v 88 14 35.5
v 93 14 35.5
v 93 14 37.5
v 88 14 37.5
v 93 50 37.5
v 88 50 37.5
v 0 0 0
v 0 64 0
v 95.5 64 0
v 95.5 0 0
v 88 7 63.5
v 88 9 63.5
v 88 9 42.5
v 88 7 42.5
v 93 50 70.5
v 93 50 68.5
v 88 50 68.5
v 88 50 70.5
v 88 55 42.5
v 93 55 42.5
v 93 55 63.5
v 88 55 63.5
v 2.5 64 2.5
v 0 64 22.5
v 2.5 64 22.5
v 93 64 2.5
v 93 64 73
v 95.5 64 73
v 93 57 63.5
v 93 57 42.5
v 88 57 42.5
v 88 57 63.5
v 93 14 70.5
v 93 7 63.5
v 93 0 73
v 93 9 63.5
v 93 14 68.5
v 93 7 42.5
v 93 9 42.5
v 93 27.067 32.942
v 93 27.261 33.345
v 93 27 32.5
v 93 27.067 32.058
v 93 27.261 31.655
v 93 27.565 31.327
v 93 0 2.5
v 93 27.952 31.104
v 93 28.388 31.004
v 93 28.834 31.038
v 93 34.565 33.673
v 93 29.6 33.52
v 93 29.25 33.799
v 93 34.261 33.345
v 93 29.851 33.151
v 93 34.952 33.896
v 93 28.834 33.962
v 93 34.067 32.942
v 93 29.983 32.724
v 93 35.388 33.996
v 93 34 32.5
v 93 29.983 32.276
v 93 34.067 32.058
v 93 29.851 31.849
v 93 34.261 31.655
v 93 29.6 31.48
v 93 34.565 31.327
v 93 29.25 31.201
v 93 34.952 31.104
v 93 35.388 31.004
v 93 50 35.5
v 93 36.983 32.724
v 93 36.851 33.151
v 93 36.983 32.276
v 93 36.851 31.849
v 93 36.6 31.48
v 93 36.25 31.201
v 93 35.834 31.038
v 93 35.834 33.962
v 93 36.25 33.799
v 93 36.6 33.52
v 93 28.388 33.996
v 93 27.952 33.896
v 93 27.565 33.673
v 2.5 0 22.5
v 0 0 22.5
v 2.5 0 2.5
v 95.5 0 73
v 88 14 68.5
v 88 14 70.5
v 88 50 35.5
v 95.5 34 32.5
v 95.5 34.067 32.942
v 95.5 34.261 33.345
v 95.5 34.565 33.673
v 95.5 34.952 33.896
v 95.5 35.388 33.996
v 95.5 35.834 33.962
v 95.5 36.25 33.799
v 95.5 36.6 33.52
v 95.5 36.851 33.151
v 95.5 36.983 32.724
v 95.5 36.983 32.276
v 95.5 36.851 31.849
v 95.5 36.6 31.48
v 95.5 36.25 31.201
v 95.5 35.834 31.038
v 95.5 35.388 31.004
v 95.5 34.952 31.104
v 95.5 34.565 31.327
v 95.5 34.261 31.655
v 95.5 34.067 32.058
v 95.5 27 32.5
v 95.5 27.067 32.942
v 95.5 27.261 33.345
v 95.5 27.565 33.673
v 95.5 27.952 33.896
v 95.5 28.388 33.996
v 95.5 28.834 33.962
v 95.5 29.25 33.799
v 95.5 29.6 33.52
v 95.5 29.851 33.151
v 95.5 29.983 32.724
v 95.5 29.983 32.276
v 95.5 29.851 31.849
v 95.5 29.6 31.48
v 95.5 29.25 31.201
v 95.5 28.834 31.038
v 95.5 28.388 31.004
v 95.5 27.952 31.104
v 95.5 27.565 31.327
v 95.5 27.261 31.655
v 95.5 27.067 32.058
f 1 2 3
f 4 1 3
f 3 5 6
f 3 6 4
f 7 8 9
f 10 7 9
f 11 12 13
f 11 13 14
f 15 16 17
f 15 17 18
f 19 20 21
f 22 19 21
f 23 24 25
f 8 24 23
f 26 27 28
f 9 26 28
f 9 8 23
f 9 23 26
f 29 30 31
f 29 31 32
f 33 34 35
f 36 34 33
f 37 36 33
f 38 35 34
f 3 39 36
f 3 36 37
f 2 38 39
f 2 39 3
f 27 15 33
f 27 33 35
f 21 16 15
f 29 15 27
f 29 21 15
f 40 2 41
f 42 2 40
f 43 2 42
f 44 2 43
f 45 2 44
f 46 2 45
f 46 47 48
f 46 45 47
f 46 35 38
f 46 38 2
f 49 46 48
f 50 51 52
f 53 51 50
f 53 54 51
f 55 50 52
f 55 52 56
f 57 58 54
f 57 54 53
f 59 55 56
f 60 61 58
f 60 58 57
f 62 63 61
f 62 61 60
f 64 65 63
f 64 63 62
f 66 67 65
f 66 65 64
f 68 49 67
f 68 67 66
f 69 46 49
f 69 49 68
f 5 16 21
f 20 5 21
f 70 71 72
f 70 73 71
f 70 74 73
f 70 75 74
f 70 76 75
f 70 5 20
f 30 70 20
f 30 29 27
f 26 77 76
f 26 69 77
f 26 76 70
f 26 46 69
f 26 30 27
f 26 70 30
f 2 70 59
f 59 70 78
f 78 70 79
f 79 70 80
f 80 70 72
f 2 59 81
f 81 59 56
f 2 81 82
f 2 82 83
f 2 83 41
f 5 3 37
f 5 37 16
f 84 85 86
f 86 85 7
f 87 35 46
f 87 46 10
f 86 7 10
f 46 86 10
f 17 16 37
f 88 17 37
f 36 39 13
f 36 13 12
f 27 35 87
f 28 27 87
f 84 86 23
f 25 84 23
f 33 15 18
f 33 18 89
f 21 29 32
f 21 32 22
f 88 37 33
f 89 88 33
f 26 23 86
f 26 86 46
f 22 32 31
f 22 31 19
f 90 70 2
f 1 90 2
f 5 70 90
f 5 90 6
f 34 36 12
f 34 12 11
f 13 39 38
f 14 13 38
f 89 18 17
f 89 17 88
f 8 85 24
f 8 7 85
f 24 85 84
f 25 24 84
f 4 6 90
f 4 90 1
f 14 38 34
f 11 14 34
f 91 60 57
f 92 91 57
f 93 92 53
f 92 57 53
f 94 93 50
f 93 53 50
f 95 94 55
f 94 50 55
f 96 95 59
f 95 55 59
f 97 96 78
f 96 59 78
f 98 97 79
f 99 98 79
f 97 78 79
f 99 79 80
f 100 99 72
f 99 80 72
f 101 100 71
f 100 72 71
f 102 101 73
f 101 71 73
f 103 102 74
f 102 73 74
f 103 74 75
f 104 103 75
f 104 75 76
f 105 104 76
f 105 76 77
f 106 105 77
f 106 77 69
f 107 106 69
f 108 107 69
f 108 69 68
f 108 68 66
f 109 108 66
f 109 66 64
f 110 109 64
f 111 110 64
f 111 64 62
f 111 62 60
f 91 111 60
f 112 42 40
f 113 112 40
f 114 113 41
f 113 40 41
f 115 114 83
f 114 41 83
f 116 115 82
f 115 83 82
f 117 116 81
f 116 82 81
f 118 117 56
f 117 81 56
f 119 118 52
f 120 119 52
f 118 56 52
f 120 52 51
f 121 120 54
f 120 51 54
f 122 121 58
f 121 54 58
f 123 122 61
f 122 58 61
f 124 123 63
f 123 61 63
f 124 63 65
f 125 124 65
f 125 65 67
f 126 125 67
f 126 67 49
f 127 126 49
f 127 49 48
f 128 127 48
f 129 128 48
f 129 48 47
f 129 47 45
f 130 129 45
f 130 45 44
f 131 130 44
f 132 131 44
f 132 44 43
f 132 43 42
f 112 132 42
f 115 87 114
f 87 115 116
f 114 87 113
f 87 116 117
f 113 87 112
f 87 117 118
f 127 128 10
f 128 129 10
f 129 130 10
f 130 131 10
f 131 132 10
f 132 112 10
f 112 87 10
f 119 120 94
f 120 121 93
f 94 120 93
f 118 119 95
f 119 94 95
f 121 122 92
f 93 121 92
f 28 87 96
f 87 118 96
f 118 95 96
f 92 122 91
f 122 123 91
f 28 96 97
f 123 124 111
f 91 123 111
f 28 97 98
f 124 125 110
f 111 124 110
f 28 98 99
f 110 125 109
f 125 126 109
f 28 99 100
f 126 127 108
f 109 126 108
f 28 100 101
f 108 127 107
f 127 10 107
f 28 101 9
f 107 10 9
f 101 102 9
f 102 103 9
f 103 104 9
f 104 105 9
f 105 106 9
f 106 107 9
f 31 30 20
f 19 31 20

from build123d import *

# Parameters (mm, degrees)
F0_W     = 95.5
F0_H     = 64
F1_DEPTH = 2.5
F2_W     = 2.5
F2_H     = 64
F3_DEPTH = 20
F4_DEPTH = 70.5
F5_W     = 36
F5_H     = 2
F5_W_2   = 2
F5_H_2   = 21
F6_DEPTH = 5
F5_R     = 1.5
F7_DEPTH = 25


with BuildPart() as f1:
    # F0 (on Top) → F1 (new body)
    with BuildSketch(Plane.XY):
        with Locations((47.75, 32)):
            Rectangle(F0_W, F0_H)
    extrude(amount=F1_DEPTH)

    # F2 (on face) → F3 (join)
    with BuildSketch(Plane.XY.offset(2.5)):
        with Locations((1.25, 32)):
            Rectangle(F2_W, F2_H)
    extrude(amount=F3_DEPTH)

    # F2 (on face) → F4 (join)
    with BuildSketch(Plane.XY.offset(2.5)):
        with Locations((94.25, 32)):
            Rectangle(F2_W, F2_H)
    extrude(amount=F4_DEPTH)

    # F5 (on face) → F6 (join)
    with BuildSketch(Plane(origin=(93, 0, 0), x_dir=(0, -1, 0), z_dir=(-1, 0, 0))):
        with Locations((-32, 69.5)):
            Rectangle(F5_W, F5_H)
        with Locations((-8, 53)):
            Rectangle(F5_W_2, F5_H_2)
        with Locations((-32, 36.5)):
            Rectangle(F5_W, F5_H)
        with Locations((-56, 53)):
            Rectangle(F5_W_2, F5_H_2)
    extrude(amount=F6_DEPTH)

    # F5 (on face) → F7 (cut)
    with BuildSketch(Plane(origin=(93, 0, 0), x_dir=(0, -1, 0), z_dir=(-1, 0, 0))):
        with Locations((-35.5, 32.5)):
            Circle(F5_R)
        with Locations((-28.5, 32.5)):
            Circle(F5_R)
    extrude(amount=-F7_DEPTH, mode=Mode.SUBTRACT)


solid = f1.part
